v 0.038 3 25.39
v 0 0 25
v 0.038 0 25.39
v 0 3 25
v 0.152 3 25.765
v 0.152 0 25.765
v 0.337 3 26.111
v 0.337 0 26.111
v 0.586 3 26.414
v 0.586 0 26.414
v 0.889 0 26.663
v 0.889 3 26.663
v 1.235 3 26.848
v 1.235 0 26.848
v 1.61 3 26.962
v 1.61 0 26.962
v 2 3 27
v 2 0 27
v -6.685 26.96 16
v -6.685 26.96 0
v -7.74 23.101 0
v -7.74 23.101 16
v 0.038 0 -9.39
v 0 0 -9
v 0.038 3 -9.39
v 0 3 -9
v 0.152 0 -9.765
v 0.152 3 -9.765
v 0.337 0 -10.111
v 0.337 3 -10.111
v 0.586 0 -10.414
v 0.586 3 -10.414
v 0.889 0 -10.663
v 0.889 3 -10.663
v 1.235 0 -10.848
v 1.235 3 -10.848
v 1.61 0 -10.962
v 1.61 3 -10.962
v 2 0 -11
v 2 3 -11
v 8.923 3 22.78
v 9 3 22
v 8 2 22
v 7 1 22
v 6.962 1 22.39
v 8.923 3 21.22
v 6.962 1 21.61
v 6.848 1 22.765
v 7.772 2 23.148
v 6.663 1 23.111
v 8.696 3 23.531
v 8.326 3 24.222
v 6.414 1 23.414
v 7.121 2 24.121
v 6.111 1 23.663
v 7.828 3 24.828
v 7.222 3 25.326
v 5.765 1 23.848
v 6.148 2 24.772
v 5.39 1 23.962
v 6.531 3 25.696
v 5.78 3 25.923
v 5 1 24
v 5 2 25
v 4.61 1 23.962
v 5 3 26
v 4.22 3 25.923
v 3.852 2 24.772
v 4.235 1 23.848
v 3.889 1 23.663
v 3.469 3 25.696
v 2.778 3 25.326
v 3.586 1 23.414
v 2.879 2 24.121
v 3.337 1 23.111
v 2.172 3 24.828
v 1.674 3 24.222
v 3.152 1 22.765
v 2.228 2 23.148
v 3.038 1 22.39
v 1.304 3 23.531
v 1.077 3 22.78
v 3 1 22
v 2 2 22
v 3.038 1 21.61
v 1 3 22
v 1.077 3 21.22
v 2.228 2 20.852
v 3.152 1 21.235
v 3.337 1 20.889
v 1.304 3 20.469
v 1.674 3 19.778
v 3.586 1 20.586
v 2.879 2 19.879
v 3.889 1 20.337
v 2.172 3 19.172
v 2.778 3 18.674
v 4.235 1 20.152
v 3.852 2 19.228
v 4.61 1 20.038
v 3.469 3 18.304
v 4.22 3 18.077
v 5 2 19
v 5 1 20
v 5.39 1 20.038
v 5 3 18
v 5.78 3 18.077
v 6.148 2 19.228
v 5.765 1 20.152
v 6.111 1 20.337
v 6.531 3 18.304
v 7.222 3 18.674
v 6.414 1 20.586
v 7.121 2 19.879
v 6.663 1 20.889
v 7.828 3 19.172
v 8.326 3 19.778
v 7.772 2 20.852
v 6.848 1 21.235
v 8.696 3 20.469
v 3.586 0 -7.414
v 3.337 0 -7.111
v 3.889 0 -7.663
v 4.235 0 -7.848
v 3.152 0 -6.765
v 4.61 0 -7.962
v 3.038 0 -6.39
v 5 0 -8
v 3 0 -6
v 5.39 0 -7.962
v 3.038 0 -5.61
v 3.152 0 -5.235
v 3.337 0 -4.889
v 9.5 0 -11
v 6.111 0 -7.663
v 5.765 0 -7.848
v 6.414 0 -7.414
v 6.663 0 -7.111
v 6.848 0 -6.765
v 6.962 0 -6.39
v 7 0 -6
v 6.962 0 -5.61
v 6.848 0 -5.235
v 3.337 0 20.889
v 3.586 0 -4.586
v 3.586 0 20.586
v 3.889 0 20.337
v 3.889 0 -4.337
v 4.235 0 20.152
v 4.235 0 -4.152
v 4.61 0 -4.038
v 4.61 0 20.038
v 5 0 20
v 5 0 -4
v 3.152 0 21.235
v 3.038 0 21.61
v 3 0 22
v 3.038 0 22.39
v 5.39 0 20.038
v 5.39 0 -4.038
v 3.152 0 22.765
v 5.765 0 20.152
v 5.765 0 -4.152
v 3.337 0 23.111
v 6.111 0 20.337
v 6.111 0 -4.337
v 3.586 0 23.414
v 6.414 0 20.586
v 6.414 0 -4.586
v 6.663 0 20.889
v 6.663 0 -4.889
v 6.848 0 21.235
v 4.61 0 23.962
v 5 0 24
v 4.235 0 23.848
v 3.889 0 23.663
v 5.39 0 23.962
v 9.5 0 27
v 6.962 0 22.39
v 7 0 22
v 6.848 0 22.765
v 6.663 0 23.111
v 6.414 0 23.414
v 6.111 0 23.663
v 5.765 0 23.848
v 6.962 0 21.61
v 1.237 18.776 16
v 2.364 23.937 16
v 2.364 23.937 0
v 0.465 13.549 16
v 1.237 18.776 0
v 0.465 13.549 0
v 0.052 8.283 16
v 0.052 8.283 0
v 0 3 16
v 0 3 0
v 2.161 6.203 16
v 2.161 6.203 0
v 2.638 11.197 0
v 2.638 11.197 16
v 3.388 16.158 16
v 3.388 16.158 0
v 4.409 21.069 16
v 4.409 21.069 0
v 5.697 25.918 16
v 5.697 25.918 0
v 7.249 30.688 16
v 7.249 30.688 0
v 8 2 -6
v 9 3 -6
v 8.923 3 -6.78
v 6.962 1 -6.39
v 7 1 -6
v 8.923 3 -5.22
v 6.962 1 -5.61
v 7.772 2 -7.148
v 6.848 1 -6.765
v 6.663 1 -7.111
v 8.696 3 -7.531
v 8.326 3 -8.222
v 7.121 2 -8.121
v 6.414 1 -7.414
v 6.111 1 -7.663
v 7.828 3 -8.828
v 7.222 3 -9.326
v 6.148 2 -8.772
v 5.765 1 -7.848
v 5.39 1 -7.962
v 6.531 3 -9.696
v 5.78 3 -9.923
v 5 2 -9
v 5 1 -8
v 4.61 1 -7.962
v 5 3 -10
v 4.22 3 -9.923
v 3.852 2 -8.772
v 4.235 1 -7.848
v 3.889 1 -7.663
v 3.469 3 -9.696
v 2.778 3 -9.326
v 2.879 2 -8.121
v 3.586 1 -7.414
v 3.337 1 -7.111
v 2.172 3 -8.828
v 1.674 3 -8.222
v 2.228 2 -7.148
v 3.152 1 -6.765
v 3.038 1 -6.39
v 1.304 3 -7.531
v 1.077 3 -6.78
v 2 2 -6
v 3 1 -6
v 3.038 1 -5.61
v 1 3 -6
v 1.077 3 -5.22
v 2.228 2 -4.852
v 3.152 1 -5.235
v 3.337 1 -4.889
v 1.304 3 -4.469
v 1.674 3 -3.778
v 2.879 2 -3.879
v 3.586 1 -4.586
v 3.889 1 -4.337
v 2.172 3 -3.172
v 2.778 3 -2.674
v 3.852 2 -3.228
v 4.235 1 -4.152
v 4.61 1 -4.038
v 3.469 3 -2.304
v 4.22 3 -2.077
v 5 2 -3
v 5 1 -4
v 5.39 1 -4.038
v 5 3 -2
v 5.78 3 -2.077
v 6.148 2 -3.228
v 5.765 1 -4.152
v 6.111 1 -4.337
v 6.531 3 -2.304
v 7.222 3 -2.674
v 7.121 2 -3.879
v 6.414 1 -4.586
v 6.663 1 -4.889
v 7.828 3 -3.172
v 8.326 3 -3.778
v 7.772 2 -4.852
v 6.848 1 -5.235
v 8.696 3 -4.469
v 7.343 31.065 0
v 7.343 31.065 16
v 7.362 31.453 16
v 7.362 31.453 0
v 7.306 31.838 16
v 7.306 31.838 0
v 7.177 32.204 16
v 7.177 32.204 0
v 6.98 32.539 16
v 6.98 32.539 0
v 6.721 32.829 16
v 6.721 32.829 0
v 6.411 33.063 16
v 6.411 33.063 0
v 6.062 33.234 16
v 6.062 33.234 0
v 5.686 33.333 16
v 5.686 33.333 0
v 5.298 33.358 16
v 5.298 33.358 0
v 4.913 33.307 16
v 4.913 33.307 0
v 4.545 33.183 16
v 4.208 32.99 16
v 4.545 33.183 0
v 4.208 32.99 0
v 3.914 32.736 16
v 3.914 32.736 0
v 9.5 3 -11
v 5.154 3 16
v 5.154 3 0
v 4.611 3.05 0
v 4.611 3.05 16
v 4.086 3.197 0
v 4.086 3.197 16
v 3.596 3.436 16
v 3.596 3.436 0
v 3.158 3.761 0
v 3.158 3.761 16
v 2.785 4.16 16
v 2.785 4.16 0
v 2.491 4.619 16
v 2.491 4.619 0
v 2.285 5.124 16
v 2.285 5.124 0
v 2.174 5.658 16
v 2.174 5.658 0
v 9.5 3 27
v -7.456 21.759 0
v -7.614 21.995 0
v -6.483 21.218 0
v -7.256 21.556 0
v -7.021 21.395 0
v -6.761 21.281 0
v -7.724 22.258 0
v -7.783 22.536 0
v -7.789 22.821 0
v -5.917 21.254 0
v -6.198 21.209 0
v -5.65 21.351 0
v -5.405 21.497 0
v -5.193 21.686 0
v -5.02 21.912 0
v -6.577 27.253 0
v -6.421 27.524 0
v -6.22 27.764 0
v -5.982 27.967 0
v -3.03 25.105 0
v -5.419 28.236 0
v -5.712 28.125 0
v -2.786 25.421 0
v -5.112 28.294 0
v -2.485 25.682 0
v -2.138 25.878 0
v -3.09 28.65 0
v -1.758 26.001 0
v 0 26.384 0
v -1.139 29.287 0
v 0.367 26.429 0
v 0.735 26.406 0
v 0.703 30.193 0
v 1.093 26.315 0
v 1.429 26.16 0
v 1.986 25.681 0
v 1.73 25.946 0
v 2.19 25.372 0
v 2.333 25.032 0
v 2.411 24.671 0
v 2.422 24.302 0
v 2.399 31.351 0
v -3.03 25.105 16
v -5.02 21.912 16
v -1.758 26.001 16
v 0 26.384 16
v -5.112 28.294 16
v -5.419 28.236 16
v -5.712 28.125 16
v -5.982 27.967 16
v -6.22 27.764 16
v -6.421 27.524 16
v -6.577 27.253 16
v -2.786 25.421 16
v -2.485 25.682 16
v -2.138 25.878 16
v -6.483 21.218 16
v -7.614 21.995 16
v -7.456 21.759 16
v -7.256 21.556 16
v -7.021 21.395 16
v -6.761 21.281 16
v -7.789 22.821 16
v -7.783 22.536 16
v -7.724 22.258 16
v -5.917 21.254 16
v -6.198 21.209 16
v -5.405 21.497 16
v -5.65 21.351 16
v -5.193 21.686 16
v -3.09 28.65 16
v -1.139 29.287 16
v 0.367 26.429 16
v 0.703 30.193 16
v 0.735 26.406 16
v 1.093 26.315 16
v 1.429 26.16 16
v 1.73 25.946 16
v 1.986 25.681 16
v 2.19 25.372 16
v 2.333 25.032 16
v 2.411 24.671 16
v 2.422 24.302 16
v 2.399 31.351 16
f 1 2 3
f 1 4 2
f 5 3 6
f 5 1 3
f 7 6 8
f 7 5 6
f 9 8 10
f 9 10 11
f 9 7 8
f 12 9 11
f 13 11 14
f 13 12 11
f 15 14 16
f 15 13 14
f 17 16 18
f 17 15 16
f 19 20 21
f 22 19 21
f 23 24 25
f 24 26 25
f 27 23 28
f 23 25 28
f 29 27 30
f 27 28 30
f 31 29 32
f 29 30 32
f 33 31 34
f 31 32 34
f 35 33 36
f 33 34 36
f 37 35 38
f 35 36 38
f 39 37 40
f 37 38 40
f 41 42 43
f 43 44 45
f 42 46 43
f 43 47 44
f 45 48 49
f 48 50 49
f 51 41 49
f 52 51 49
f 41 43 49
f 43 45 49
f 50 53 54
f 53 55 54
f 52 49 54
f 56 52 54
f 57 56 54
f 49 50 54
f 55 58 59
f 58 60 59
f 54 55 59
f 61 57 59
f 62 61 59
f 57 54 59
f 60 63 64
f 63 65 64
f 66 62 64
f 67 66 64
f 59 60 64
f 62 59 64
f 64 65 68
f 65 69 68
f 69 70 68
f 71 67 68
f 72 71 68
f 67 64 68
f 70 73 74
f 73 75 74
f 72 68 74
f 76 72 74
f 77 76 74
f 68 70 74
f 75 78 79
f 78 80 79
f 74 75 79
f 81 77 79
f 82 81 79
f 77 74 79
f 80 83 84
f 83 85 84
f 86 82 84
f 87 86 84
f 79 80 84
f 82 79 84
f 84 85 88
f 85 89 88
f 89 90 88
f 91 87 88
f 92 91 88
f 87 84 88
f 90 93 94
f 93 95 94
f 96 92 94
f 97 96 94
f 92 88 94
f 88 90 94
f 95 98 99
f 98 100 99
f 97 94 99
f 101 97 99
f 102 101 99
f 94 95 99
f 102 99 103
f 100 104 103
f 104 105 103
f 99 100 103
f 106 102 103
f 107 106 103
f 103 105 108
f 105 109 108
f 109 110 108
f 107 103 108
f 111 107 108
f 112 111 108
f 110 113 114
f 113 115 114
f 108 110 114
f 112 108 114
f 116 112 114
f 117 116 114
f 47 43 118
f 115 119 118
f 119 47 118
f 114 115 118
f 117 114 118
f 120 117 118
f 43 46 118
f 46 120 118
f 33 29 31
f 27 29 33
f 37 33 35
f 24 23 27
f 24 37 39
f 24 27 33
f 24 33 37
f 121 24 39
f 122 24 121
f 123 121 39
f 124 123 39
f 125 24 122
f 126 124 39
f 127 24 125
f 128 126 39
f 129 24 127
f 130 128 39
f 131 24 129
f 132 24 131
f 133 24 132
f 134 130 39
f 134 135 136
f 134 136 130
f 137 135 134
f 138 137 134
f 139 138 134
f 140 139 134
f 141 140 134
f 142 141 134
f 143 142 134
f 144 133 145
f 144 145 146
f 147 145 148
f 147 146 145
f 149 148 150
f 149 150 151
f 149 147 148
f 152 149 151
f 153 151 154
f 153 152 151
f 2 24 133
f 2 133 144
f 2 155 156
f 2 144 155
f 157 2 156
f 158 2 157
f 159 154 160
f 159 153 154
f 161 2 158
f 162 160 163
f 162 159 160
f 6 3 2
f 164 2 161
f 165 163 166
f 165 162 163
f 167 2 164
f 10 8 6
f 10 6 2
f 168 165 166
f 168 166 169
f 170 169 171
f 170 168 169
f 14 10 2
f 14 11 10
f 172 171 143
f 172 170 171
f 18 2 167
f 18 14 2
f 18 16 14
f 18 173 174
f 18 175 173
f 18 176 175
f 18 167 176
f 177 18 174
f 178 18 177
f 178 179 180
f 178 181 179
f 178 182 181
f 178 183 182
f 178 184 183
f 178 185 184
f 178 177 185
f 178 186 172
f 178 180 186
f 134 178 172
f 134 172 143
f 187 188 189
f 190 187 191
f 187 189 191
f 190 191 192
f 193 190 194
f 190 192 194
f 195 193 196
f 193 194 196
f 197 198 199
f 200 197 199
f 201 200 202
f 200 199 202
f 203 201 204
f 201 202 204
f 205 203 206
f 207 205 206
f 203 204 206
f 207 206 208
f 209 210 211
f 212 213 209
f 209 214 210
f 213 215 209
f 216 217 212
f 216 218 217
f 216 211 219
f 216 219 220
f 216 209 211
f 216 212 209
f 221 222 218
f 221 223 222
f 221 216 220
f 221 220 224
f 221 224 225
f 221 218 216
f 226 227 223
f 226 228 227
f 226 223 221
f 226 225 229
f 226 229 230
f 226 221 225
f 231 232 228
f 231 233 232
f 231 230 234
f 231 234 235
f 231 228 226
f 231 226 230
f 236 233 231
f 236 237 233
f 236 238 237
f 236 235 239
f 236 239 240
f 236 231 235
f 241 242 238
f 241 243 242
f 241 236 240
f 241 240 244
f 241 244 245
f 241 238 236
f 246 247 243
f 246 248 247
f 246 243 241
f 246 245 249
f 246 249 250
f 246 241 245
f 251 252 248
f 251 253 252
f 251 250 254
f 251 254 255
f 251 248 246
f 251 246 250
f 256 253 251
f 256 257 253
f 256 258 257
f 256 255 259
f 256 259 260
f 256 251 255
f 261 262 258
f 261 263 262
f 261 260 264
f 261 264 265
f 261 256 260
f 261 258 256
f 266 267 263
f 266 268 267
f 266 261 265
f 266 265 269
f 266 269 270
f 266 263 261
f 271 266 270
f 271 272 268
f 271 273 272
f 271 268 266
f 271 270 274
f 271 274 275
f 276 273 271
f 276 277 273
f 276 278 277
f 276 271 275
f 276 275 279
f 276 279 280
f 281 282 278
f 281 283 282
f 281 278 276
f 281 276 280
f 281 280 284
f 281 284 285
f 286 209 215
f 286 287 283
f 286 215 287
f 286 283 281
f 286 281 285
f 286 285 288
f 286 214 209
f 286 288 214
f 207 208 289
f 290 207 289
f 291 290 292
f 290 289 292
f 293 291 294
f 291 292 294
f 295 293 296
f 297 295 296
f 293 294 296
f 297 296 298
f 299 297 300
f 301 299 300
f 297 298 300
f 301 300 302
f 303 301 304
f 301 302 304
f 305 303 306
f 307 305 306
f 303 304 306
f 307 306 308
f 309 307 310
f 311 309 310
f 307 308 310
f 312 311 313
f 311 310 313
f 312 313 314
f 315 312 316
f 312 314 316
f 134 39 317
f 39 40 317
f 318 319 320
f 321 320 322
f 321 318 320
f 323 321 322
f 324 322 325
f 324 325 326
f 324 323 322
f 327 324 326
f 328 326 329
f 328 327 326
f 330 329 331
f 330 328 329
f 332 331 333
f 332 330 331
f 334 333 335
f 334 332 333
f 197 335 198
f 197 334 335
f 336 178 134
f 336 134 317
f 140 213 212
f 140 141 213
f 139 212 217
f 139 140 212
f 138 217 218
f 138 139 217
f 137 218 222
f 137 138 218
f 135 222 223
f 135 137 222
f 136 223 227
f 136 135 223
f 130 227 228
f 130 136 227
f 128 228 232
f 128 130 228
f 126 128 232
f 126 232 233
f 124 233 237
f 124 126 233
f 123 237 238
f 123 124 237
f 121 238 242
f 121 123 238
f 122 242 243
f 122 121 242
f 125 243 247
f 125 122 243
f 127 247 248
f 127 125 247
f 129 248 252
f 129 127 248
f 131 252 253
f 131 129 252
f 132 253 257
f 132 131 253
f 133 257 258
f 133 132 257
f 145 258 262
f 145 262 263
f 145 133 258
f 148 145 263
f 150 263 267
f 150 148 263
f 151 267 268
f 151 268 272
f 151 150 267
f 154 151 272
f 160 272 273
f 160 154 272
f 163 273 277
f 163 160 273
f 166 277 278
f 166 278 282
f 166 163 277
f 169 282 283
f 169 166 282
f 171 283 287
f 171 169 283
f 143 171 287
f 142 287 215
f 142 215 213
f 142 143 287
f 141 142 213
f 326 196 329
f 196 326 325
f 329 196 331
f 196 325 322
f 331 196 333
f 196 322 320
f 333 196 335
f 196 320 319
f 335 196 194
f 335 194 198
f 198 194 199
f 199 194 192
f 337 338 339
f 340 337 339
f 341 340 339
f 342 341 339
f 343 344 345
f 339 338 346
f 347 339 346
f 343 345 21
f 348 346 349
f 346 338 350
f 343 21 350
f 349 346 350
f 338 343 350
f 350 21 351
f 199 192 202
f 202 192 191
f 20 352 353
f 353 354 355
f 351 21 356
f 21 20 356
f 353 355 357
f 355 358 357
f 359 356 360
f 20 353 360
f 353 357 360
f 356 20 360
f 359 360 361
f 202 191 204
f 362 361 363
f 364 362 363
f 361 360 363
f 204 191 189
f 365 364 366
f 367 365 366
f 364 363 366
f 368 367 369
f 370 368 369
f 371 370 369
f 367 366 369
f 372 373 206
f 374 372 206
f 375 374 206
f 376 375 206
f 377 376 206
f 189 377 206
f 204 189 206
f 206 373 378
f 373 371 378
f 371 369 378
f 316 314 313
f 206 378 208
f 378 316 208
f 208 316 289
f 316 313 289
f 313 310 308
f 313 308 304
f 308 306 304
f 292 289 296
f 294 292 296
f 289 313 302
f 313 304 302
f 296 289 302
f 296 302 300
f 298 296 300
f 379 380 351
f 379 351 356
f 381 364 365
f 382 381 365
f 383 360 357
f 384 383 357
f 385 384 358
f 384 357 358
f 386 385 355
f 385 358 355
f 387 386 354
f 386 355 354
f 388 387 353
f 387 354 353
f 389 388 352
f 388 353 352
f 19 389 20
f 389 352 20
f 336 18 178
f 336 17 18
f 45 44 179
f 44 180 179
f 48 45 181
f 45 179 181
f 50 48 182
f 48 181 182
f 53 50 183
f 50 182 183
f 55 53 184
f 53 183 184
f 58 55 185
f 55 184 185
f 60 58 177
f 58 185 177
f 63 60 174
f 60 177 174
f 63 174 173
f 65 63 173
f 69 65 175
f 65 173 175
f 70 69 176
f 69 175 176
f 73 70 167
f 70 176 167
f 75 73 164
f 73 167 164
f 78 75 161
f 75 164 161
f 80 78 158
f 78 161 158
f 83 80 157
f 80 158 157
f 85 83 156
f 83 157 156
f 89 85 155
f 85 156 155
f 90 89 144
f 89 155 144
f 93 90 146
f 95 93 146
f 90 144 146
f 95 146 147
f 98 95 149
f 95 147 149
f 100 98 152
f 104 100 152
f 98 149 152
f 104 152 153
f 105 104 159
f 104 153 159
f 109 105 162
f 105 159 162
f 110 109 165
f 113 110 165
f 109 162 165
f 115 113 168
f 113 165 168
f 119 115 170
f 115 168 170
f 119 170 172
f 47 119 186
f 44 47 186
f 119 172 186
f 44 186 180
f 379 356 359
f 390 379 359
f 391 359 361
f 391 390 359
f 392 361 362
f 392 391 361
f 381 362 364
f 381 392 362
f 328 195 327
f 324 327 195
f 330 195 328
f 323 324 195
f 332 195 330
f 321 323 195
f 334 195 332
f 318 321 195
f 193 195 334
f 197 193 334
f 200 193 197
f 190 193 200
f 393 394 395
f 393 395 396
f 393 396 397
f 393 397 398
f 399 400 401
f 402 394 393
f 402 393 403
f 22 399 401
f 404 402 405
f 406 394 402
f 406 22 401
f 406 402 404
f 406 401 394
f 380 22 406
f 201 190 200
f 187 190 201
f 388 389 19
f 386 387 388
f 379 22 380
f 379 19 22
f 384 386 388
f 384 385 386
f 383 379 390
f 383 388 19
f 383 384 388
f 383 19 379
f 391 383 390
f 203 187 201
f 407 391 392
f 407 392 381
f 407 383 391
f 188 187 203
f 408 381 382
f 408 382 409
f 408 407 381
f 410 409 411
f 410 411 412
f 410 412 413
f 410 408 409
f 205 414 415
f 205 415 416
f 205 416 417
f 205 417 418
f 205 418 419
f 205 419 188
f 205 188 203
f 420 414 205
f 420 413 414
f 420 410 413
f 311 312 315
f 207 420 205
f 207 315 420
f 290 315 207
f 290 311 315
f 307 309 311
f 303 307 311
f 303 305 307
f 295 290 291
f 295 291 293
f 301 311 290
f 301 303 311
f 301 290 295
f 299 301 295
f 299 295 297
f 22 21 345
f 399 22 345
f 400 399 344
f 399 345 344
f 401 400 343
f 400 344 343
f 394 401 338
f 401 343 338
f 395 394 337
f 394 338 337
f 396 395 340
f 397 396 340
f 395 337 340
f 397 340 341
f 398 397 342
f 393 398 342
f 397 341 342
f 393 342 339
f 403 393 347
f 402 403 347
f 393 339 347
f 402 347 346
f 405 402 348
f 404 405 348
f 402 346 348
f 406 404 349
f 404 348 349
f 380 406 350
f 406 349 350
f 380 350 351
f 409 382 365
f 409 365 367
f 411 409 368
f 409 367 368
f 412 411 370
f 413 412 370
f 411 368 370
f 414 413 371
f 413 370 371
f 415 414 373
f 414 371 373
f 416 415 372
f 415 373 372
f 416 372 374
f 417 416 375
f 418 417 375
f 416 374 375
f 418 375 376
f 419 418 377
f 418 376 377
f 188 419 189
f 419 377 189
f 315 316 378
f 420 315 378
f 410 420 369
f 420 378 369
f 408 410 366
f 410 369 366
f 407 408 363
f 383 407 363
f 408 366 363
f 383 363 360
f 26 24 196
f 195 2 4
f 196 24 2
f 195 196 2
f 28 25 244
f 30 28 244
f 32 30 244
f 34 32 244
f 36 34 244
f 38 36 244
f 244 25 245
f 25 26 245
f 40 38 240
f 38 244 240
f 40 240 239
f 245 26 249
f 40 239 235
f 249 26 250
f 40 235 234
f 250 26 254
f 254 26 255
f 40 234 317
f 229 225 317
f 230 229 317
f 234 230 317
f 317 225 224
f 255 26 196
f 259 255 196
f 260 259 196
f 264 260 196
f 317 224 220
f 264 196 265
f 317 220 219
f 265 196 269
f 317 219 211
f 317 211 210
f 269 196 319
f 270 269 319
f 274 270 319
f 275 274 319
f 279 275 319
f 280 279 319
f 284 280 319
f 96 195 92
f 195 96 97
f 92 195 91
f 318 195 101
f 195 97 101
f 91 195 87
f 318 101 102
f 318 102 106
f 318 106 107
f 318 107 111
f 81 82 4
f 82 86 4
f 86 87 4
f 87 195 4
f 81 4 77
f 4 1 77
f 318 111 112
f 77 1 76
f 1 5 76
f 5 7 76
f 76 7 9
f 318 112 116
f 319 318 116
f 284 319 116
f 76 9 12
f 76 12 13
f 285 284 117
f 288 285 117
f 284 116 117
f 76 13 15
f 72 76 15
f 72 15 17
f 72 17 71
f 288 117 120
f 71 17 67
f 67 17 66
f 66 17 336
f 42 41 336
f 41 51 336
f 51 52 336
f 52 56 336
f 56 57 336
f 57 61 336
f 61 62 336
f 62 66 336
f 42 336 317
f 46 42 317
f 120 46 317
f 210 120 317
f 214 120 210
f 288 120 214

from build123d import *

# Parameters (mm, degrees)
F1_DEPTH       = 16
F2_W           = 9.5
F2_H           = 3
F3_DEPTH       = 11
F6_D           = 4
F6_CSINK_D     = 8
F6_CSINK_ANGLE = 90
F8_R           = 2
F9_R           = 3
F10_R          = 2


with BuildPart() as f1:
    # F0 (on Top) → F1 (new body)
    with BuildSketch(Plane.XY):
        with BuildLine():
            ThreePointArc((2, 3), (3.5524079534, 17.0474266553), (7.2489157042, 30.688394236))
            ThreePointArc((7.2489157042, 30.688394236), (6.4110728807, 33.0634017317), (3.9140154247, 32.735765863))
            ThreePointArc((3.9140154247, 32.735765863), (-0.2014778431, 29.7072757815), (-5.1119606936, 28.2944080641))
            ThreePointArc((-5.1119606936, 28.2944080641), (-6.1052113837, 27.8706276086), (-6.6852554951, 26.9597567962))
            Line((-6.6852554951, 26.9597567962), (-7.7398444423, 23.101280134))
            ThreePointArc((-7.7398444423, 23.101280134), (-6.8937110874, 21.3313839825), (-5.019957521, 21.9123500865))
            Line((-5.019957521, 21.9123500865), (-2.5832541287, 25.8215889335))
            Line((-2.5832541287, 25.8215889335), (0, 26.3843059314))
            ThreePointArc((0, 26.3843059314), (1.8642632491, 25.8195517282), (2.3638801074, 23.9367857399))
            ThreePointArc((2.3638801074, 23.9367857399), (0.4646962608, 13.5493737022), (0, 3))
            Line((0, 3), (0, 0))
            Line((0, 0), (9.5, 0))
            Line((9.5, 0), (9.5, 3))
            Line((9.5, 3), (2, 3))
        make_face()
    extrude(amount=F1_DEPTH)

    # F2 (on face) → F3 (join)
    with BuildSketch(Plane.XY.offset(16)):
        with Locations((4.75, 1.5)):
            Rectangle(F2_W, F2_H)
    extrude(amount=F3_DEPTH)

    # F6 (through all)
    with Locations(Plane(origin=(0, 3, 0), x_dir=(-1, 0, 0), z_dir=(0, 1, 0))):
        with Locations((-5, 22)):
            CounterSinkHole(F6_D / 2, F6_CSINK_D / 2, counter_sink_angle=F6_CSINK_ANGLE)

    # F7: F1 across plane


with BuildPart() as f1_1:
    add(f1.part)
    add(f1.part.mirror(Plane.XY.offset(8)))

    # F8
    f8_edges = [f1_1.edges().sort_by_distance(p)[0] for p in [
        (0, 1.5, 27),
        (0, 1.5, -11),
    ]]
    fillet(f8_edges, radius=F8_R)

    # F9
    f9_edges = [f1_1.edges().sort_by_distance(p)[0] for p in [
        (2, 3, 8),
    ]]
    fillet(f9_edges, radius=F9_R)

    # F10
    f10_edges = [f1_1.edges().sort_by_distance(p)[0] for p in [
        (-2.583254, 25.821589, 8),
    ]]
    fillet(f10_edges, radius=F10_R)


solid = f1_1.part
